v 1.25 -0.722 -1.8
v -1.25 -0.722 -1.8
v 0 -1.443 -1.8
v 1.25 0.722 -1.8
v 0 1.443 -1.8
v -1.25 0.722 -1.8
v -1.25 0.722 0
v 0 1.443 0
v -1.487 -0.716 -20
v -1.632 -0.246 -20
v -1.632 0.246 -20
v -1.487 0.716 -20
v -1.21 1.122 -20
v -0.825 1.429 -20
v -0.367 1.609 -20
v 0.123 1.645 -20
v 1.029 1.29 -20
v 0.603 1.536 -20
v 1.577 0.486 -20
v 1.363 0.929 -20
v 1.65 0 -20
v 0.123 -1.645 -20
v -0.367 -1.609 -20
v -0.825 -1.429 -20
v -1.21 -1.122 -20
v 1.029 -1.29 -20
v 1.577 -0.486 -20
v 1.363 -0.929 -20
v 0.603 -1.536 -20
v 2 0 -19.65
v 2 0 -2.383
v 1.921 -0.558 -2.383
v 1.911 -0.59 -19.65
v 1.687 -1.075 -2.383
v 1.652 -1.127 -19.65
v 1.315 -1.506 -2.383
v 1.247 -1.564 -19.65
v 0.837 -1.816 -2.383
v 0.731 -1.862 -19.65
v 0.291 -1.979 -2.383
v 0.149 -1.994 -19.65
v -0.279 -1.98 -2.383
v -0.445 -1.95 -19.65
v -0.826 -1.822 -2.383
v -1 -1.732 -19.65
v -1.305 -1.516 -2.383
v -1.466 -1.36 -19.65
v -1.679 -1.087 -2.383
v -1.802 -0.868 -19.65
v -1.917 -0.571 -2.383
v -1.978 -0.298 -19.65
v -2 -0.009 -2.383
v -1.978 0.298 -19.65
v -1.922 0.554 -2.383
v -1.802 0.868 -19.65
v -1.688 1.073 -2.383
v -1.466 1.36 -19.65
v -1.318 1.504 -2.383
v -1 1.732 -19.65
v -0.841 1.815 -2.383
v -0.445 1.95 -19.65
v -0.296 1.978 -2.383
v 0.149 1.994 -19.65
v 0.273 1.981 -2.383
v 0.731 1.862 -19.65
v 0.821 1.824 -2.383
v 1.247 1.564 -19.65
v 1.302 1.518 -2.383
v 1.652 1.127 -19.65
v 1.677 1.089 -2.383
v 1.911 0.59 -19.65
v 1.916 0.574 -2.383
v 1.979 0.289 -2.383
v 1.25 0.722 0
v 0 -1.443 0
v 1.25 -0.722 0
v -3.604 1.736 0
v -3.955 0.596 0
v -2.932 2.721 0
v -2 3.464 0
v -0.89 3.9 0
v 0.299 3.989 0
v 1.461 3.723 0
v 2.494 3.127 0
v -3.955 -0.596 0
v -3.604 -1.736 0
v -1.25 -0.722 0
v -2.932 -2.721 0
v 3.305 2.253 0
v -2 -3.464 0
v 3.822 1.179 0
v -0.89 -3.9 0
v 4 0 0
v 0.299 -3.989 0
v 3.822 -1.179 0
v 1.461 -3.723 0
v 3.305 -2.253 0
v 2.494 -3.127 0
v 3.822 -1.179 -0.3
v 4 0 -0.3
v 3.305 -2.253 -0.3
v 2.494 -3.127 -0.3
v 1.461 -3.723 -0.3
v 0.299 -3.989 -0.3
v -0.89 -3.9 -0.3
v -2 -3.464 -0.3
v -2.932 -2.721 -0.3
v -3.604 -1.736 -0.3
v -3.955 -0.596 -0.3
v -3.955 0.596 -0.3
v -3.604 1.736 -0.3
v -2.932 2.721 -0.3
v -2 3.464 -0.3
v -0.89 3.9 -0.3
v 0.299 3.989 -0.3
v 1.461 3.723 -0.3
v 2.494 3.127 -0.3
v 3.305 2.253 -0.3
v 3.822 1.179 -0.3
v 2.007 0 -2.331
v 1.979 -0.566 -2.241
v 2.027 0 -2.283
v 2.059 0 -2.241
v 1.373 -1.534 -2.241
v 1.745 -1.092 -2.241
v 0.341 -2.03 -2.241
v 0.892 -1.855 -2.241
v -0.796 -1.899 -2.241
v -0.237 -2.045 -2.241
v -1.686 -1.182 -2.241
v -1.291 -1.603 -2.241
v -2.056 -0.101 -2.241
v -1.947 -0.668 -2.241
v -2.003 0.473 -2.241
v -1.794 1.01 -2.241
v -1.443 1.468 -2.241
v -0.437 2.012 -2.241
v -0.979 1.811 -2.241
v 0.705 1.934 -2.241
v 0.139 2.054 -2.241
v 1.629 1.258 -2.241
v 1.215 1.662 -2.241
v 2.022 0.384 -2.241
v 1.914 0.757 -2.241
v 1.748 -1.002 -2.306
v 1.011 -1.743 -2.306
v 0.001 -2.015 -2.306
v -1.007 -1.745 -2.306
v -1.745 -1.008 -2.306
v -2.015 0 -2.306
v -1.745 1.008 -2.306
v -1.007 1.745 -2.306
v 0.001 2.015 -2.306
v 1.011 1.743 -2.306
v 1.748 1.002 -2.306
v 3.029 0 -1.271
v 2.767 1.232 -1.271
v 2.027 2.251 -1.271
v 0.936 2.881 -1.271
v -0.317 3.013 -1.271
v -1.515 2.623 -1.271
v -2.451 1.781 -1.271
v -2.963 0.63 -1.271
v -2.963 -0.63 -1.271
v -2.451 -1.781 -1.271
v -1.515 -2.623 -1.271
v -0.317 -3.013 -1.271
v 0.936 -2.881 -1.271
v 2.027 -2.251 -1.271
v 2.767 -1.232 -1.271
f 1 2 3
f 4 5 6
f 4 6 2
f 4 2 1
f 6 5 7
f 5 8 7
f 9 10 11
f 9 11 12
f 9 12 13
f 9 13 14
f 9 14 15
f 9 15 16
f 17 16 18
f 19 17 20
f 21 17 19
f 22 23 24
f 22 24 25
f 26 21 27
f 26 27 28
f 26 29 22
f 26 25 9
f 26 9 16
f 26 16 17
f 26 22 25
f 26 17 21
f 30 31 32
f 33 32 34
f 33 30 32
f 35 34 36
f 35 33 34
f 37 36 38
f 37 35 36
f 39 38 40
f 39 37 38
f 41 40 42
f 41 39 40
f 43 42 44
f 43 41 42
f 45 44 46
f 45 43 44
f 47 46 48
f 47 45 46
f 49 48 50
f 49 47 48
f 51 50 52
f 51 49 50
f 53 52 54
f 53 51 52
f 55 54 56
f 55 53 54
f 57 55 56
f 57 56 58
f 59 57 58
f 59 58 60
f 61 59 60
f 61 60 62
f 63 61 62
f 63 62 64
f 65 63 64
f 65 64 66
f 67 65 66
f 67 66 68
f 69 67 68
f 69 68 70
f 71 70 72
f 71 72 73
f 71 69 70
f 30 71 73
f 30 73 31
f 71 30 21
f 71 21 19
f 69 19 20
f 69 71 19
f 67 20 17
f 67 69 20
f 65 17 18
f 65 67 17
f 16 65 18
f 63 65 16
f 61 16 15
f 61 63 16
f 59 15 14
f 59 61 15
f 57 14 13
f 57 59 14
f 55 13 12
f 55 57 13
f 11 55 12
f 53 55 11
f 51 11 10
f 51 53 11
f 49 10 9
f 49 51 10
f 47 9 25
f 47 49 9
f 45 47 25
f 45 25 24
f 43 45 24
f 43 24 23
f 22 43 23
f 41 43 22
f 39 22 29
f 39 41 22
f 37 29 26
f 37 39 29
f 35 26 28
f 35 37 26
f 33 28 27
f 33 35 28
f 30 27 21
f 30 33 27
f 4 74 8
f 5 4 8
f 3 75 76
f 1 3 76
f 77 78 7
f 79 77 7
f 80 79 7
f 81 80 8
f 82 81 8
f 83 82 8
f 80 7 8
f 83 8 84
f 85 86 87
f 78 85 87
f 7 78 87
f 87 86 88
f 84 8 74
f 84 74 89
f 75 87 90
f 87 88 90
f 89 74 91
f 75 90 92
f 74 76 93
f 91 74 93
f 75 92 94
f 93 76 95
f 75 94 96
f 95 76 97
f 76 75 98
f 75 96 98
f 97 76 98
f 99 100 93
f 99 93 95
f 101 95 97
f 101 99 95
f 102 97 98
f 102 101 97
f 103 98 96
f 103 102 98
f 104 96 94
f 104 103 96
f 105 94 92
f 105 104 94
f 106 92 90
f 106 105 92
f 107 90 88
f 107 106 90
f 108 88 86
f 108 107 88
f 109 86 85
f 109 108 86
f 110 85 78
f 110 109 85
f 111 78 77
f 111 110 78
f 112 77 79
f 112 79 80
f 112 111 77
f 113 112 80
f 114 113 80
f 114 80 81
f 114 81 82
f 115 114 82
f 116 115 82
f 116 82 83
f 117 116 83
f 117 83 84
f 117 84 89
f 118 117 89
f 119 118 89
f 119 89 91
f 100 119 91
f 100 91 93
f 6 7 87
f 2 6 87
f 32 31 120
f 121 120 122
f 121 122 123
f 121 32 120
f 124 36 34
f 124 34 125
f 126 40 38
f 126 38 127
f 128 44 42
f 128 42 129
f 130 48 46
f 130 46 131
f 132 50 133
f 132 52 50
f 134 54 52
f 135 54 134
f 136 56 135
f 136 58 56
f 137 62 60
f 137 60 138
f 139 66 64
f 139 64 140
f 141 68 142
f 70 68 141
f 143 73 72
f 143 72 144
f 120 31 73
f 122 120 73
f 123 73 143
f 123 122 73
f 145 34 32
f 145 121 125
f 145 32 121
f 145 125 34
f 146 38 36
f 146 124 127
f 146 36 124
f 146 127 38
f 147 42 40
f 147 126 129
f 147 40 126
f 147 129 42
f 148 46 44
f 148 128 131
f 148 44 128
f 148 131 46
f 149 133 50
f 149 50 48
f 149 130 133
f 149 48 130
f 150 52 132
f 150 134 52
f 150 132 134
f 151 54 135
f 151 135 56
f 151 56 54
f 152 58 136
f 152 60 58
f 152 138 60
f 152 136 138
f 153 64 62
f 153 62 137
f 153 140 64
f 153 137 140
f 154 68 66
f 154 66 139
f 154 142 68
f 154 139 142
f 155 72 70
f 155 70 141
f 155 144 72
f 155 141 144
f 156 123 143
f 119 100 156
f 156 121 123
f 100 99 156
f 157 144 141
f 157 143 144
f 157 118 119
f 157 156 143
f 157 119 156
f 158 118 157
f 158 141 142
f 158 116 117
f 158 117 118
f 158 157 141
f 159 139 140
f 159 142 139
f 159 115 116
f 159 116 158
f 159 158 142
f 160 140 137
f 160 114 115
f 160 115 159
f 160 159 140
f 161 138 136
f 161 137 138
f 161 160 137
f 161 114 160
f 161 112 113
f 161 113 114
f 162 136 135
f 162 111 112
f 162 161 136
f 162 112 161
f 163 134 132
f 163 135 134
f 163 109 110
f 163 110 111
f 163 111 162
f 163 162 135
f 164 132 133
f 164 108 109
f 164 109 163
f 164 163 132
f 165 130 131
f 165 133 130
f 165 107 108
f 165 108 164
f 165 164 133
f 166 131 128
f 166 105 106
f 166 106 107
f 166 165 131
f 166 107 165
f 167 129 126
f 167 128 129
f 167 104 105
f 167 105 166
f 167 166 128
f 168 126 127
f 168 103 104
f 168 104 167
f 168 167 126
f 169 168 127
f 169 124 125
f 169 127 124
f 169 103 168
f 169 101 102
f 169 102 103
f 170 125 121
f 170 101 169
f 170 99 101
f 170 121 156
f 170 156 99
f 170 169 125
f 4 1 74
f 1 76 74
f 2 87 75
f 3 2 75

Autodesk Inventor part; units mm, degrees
ref_plane "YZ Plane" through (0, 0, 0) normal (1, 0, 0) x (0, 1, 0)
sketch "Sketch1" plane through (0, 0, 0) normal (0, 1, 0) x (-1, 0, 0)
  point P0 (0, 0)
sketch "Sketch2" plane through (0, 0, 0) normal (0, 1, 0) x (-1, 0, 0)
  line L0 (-2, -20) -> (0, -20)
  line L1 (-2, -2.3) -> (-2, -20)
  line L2 (-4, -0.3) -> (-2, -2.3)
  line L3 (-4, 0) -> (-4, -0.3)
  line L4 (0, 0) -> (-4, 0)
  line L5 (0, -20) -> (0, 0)
  line L6 (0, -20) -> (0, 0)
  line L7 (0, -24) -> (0, 4) projected
  line L8 (0.8, 0) -> (-4.8, 0) projected
  dimension "d3" = 4
  dimension "d5" = 2
  dimension "d7" = 20
  dimension "ParC" = 0.3
  dimension "d22" = 0
  dimension "d23" = 0
  dimension "d43" = 45
revolve "Revolution1" add sketch "Sketch2" angle 360 about axis through (0, 0, -20) along (0, 0, -1)
sketch "Sketch3" plane through (0, 0, 0) normal (0, 0, 1) x (1, 0, 0)
  line L0 (-1.25, 0.7217) -> (-1.25, -0.7217)
  line L1 (0, 1.4434) -> (-1.25, 0.7217)
  line L2 (1.25, 0.7217) -> (0, 1.4434)
  line L3 (1.25, -0.7217) -> (1.25, 0.7217)
  line L4 (0, -1.4434) -> (1.25, -0.7217)
  line L5 (-1.25, -0.7217) -> (0, -1.4434)
  circle A0 centre (0, 0) radius 1.25 construction
  circle A1 centre (0, 0) radius 2 construction
  dimension "d11" = 2.5
  dimension "d13" = 120
  dimension "d15" = 120
extrude "Extrusion1" cut sketch "Sketch3" against normal blind 1.8
fillet "Fillet1" radius 0.2 1 edges at (-2, 0, -2.3)
chamfer "Chamfer1" distance 0.35 angle 45 1 edges at (-2, 0, -20) measured on face at (-0.9288, -1.7713, -14.1276)
thread "Thread1" size "M4x0.7" class "6g" standard "ISO Metric profile" length 14
ref_plane "MSC_PF1" through (0, 0, 0) normal (1, 0, 0) x (0, 1, 0)
ref_plane "MSC_PT1" through (0, 0, 0) normal (0, 0, -1) x (-1, 0, 0)
equation "\"d3\" = 0.5 * dk"
equation "\"d5\" = 0.5 * NND"
equation "\"d7\" = NLG"
equation "\"d43\" = 0.5 * ang"
equation "\"d18\" = r"
equation "\"d19\" = 0.5 * PTC"
equation "\"d39\" = 0.5 * PTC"
equation "\"d11\" = ParS"
equation "\"d16\" = ParT"
equation "\"NND\" = 4"
equation "\"PTC\" = 0.7"
equation "\"dk\" = 8"
equation "\"ParK\" = 2.3"
equation "\"ParS\" = 2.5"
equation "\"ParT\" = 1.8"
equation "\"r\" = 0.2"
equation "\"NLG\" = 20"
equation "\"ang\" = 90deg"
equation "\"THREADDIA\" = NND"
properties part number "ISO 10642 - M4x20" material "Steel, Mild"
